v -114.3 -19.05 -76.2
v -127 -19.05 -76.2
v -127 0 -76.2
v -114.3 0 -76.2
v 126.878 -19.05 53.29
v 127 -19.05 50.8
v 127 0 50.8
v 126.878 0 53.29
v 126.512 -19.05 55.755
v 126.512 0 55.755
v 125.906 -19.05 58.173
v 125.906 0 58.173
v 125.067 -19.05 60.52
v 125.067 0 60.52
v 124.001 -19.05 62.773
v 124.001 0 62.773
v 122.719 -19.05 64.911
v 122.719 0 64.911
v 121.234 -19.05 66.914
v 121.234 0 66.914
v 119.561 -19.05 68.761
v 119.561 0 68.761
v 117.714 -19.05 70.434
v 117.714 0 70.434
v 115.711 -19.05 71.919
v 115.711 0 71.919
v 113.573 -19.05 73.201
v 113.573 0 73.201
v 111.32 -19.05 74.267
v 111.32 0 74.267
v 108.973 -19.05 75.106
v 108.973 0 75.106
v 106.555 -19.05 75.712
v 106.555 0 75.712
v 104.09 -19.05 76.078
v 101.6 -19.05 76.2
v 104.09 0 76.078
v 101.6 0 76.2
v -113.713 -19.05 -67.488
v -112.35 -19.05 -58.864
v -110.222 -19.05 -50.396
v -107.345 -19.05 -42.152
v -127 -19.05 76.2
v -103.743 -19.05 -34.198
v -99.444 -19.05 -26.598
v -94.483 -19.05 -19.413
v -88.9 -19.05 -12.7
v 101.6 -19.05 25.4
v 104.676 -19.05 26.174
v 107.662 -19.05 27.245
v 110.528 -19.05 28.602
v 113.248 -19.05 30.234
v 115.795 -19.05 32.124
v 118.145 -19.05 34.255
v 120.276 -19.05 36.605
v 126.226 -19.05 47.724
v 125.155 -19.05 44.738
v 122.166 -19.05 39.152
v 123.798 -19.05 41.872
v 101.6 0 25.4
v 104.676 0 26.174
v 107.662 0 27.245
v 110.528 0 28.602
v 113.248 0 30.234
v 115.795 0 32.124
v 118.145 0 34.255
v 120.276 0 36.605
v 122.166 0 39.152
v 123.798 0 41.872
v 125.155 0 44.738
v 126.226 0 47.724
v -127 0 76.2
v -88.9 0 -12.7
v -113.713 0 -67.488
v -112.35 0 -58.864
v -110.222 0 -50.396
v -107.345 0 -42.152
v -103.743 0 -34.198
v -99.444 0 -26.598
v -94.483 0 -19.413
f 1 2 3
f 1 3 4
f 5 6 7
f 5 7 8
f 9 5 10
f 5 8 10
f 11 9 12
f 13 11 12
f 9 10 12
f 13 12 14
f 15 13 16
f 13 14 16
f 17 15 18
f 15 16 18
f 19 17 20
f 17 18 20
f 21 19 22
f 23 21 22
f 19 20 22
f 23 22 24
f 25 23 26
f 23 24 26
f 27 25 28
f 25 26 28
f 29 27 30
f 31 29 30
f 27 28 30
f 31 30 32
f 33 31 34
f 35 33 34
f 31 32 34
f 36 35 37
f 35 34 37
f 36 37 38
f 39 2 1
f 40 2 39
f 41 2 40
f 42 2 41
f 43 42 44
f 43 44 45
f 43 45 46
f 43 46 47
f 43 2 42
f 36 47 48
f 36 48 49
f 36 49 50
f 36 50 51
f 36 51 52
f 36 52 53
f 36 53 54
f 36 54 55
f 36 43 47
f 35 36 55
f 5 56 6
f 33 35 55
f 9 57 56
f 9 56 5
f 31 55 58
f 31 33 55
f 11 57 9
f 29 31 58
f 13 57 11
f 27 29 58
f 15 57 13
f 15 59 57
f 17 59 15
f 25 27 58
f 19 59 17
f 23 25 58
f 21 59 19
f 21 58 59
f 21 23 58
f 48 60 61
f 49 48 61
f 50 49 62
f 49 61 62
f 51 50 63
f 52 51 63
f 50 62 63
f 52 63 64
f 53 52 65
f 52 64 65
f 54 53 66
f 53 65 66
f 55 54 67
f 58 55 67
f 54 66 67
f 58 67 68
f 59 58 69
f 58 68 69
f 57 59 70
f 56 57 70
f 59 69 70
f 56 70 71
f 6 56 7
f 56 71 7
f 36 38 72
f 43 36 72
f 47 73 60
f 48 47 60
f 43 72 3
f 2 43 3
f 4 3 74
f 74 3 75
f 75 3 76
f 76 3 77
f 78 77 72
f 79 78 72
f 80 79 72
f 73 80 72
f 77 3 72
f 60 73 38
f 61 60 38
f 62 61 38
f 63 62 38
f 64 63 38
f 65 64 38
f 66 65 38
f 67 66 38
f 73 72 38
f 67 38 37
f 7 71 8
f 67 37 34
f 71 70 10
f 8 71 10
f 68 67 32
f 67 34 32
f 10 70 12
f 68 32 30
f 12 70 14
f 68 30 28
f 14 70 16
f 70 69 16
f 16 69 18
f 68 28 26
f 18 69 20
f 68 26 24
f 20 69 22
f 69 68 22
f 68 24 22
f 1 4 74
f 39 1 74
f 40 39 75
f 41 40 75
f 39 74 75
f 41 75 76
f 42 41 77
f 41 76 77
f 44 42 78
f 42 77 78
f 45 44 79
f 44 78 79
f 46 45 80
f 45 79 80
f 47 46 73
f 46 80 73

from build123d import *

# Parameters (mm, degrees)
F1_DEPTH = 19.05


with BuildPart() as f1:
    # F0 (on Front) → F1 (new body)
    with BuildSketch(Plane.XZ):
        with BuildLine():
            Line((101.6, 76.2), (-127, 76.2))
            Line((-127, 76.2), (-127, -76.2))
            Line((-127, -76.2), (-114.3, -76.2))
            ThreePointArc((-114.3, -76.2), (-107.345229, -42.151908), (-88.9, -12.7))
            Line((-88.9, -12.7), (101.6, 25.4))
            ThreePointArc((101.6, 25.4), (118.145251, 34.254749), (127, 50.8))
            ThreePointArc((127, 50.8), (119.560512, 68.760512), (101.6, 76.2))
        make_face()
    extrude(amount=F1_DEPTH)


solid = f1.part
